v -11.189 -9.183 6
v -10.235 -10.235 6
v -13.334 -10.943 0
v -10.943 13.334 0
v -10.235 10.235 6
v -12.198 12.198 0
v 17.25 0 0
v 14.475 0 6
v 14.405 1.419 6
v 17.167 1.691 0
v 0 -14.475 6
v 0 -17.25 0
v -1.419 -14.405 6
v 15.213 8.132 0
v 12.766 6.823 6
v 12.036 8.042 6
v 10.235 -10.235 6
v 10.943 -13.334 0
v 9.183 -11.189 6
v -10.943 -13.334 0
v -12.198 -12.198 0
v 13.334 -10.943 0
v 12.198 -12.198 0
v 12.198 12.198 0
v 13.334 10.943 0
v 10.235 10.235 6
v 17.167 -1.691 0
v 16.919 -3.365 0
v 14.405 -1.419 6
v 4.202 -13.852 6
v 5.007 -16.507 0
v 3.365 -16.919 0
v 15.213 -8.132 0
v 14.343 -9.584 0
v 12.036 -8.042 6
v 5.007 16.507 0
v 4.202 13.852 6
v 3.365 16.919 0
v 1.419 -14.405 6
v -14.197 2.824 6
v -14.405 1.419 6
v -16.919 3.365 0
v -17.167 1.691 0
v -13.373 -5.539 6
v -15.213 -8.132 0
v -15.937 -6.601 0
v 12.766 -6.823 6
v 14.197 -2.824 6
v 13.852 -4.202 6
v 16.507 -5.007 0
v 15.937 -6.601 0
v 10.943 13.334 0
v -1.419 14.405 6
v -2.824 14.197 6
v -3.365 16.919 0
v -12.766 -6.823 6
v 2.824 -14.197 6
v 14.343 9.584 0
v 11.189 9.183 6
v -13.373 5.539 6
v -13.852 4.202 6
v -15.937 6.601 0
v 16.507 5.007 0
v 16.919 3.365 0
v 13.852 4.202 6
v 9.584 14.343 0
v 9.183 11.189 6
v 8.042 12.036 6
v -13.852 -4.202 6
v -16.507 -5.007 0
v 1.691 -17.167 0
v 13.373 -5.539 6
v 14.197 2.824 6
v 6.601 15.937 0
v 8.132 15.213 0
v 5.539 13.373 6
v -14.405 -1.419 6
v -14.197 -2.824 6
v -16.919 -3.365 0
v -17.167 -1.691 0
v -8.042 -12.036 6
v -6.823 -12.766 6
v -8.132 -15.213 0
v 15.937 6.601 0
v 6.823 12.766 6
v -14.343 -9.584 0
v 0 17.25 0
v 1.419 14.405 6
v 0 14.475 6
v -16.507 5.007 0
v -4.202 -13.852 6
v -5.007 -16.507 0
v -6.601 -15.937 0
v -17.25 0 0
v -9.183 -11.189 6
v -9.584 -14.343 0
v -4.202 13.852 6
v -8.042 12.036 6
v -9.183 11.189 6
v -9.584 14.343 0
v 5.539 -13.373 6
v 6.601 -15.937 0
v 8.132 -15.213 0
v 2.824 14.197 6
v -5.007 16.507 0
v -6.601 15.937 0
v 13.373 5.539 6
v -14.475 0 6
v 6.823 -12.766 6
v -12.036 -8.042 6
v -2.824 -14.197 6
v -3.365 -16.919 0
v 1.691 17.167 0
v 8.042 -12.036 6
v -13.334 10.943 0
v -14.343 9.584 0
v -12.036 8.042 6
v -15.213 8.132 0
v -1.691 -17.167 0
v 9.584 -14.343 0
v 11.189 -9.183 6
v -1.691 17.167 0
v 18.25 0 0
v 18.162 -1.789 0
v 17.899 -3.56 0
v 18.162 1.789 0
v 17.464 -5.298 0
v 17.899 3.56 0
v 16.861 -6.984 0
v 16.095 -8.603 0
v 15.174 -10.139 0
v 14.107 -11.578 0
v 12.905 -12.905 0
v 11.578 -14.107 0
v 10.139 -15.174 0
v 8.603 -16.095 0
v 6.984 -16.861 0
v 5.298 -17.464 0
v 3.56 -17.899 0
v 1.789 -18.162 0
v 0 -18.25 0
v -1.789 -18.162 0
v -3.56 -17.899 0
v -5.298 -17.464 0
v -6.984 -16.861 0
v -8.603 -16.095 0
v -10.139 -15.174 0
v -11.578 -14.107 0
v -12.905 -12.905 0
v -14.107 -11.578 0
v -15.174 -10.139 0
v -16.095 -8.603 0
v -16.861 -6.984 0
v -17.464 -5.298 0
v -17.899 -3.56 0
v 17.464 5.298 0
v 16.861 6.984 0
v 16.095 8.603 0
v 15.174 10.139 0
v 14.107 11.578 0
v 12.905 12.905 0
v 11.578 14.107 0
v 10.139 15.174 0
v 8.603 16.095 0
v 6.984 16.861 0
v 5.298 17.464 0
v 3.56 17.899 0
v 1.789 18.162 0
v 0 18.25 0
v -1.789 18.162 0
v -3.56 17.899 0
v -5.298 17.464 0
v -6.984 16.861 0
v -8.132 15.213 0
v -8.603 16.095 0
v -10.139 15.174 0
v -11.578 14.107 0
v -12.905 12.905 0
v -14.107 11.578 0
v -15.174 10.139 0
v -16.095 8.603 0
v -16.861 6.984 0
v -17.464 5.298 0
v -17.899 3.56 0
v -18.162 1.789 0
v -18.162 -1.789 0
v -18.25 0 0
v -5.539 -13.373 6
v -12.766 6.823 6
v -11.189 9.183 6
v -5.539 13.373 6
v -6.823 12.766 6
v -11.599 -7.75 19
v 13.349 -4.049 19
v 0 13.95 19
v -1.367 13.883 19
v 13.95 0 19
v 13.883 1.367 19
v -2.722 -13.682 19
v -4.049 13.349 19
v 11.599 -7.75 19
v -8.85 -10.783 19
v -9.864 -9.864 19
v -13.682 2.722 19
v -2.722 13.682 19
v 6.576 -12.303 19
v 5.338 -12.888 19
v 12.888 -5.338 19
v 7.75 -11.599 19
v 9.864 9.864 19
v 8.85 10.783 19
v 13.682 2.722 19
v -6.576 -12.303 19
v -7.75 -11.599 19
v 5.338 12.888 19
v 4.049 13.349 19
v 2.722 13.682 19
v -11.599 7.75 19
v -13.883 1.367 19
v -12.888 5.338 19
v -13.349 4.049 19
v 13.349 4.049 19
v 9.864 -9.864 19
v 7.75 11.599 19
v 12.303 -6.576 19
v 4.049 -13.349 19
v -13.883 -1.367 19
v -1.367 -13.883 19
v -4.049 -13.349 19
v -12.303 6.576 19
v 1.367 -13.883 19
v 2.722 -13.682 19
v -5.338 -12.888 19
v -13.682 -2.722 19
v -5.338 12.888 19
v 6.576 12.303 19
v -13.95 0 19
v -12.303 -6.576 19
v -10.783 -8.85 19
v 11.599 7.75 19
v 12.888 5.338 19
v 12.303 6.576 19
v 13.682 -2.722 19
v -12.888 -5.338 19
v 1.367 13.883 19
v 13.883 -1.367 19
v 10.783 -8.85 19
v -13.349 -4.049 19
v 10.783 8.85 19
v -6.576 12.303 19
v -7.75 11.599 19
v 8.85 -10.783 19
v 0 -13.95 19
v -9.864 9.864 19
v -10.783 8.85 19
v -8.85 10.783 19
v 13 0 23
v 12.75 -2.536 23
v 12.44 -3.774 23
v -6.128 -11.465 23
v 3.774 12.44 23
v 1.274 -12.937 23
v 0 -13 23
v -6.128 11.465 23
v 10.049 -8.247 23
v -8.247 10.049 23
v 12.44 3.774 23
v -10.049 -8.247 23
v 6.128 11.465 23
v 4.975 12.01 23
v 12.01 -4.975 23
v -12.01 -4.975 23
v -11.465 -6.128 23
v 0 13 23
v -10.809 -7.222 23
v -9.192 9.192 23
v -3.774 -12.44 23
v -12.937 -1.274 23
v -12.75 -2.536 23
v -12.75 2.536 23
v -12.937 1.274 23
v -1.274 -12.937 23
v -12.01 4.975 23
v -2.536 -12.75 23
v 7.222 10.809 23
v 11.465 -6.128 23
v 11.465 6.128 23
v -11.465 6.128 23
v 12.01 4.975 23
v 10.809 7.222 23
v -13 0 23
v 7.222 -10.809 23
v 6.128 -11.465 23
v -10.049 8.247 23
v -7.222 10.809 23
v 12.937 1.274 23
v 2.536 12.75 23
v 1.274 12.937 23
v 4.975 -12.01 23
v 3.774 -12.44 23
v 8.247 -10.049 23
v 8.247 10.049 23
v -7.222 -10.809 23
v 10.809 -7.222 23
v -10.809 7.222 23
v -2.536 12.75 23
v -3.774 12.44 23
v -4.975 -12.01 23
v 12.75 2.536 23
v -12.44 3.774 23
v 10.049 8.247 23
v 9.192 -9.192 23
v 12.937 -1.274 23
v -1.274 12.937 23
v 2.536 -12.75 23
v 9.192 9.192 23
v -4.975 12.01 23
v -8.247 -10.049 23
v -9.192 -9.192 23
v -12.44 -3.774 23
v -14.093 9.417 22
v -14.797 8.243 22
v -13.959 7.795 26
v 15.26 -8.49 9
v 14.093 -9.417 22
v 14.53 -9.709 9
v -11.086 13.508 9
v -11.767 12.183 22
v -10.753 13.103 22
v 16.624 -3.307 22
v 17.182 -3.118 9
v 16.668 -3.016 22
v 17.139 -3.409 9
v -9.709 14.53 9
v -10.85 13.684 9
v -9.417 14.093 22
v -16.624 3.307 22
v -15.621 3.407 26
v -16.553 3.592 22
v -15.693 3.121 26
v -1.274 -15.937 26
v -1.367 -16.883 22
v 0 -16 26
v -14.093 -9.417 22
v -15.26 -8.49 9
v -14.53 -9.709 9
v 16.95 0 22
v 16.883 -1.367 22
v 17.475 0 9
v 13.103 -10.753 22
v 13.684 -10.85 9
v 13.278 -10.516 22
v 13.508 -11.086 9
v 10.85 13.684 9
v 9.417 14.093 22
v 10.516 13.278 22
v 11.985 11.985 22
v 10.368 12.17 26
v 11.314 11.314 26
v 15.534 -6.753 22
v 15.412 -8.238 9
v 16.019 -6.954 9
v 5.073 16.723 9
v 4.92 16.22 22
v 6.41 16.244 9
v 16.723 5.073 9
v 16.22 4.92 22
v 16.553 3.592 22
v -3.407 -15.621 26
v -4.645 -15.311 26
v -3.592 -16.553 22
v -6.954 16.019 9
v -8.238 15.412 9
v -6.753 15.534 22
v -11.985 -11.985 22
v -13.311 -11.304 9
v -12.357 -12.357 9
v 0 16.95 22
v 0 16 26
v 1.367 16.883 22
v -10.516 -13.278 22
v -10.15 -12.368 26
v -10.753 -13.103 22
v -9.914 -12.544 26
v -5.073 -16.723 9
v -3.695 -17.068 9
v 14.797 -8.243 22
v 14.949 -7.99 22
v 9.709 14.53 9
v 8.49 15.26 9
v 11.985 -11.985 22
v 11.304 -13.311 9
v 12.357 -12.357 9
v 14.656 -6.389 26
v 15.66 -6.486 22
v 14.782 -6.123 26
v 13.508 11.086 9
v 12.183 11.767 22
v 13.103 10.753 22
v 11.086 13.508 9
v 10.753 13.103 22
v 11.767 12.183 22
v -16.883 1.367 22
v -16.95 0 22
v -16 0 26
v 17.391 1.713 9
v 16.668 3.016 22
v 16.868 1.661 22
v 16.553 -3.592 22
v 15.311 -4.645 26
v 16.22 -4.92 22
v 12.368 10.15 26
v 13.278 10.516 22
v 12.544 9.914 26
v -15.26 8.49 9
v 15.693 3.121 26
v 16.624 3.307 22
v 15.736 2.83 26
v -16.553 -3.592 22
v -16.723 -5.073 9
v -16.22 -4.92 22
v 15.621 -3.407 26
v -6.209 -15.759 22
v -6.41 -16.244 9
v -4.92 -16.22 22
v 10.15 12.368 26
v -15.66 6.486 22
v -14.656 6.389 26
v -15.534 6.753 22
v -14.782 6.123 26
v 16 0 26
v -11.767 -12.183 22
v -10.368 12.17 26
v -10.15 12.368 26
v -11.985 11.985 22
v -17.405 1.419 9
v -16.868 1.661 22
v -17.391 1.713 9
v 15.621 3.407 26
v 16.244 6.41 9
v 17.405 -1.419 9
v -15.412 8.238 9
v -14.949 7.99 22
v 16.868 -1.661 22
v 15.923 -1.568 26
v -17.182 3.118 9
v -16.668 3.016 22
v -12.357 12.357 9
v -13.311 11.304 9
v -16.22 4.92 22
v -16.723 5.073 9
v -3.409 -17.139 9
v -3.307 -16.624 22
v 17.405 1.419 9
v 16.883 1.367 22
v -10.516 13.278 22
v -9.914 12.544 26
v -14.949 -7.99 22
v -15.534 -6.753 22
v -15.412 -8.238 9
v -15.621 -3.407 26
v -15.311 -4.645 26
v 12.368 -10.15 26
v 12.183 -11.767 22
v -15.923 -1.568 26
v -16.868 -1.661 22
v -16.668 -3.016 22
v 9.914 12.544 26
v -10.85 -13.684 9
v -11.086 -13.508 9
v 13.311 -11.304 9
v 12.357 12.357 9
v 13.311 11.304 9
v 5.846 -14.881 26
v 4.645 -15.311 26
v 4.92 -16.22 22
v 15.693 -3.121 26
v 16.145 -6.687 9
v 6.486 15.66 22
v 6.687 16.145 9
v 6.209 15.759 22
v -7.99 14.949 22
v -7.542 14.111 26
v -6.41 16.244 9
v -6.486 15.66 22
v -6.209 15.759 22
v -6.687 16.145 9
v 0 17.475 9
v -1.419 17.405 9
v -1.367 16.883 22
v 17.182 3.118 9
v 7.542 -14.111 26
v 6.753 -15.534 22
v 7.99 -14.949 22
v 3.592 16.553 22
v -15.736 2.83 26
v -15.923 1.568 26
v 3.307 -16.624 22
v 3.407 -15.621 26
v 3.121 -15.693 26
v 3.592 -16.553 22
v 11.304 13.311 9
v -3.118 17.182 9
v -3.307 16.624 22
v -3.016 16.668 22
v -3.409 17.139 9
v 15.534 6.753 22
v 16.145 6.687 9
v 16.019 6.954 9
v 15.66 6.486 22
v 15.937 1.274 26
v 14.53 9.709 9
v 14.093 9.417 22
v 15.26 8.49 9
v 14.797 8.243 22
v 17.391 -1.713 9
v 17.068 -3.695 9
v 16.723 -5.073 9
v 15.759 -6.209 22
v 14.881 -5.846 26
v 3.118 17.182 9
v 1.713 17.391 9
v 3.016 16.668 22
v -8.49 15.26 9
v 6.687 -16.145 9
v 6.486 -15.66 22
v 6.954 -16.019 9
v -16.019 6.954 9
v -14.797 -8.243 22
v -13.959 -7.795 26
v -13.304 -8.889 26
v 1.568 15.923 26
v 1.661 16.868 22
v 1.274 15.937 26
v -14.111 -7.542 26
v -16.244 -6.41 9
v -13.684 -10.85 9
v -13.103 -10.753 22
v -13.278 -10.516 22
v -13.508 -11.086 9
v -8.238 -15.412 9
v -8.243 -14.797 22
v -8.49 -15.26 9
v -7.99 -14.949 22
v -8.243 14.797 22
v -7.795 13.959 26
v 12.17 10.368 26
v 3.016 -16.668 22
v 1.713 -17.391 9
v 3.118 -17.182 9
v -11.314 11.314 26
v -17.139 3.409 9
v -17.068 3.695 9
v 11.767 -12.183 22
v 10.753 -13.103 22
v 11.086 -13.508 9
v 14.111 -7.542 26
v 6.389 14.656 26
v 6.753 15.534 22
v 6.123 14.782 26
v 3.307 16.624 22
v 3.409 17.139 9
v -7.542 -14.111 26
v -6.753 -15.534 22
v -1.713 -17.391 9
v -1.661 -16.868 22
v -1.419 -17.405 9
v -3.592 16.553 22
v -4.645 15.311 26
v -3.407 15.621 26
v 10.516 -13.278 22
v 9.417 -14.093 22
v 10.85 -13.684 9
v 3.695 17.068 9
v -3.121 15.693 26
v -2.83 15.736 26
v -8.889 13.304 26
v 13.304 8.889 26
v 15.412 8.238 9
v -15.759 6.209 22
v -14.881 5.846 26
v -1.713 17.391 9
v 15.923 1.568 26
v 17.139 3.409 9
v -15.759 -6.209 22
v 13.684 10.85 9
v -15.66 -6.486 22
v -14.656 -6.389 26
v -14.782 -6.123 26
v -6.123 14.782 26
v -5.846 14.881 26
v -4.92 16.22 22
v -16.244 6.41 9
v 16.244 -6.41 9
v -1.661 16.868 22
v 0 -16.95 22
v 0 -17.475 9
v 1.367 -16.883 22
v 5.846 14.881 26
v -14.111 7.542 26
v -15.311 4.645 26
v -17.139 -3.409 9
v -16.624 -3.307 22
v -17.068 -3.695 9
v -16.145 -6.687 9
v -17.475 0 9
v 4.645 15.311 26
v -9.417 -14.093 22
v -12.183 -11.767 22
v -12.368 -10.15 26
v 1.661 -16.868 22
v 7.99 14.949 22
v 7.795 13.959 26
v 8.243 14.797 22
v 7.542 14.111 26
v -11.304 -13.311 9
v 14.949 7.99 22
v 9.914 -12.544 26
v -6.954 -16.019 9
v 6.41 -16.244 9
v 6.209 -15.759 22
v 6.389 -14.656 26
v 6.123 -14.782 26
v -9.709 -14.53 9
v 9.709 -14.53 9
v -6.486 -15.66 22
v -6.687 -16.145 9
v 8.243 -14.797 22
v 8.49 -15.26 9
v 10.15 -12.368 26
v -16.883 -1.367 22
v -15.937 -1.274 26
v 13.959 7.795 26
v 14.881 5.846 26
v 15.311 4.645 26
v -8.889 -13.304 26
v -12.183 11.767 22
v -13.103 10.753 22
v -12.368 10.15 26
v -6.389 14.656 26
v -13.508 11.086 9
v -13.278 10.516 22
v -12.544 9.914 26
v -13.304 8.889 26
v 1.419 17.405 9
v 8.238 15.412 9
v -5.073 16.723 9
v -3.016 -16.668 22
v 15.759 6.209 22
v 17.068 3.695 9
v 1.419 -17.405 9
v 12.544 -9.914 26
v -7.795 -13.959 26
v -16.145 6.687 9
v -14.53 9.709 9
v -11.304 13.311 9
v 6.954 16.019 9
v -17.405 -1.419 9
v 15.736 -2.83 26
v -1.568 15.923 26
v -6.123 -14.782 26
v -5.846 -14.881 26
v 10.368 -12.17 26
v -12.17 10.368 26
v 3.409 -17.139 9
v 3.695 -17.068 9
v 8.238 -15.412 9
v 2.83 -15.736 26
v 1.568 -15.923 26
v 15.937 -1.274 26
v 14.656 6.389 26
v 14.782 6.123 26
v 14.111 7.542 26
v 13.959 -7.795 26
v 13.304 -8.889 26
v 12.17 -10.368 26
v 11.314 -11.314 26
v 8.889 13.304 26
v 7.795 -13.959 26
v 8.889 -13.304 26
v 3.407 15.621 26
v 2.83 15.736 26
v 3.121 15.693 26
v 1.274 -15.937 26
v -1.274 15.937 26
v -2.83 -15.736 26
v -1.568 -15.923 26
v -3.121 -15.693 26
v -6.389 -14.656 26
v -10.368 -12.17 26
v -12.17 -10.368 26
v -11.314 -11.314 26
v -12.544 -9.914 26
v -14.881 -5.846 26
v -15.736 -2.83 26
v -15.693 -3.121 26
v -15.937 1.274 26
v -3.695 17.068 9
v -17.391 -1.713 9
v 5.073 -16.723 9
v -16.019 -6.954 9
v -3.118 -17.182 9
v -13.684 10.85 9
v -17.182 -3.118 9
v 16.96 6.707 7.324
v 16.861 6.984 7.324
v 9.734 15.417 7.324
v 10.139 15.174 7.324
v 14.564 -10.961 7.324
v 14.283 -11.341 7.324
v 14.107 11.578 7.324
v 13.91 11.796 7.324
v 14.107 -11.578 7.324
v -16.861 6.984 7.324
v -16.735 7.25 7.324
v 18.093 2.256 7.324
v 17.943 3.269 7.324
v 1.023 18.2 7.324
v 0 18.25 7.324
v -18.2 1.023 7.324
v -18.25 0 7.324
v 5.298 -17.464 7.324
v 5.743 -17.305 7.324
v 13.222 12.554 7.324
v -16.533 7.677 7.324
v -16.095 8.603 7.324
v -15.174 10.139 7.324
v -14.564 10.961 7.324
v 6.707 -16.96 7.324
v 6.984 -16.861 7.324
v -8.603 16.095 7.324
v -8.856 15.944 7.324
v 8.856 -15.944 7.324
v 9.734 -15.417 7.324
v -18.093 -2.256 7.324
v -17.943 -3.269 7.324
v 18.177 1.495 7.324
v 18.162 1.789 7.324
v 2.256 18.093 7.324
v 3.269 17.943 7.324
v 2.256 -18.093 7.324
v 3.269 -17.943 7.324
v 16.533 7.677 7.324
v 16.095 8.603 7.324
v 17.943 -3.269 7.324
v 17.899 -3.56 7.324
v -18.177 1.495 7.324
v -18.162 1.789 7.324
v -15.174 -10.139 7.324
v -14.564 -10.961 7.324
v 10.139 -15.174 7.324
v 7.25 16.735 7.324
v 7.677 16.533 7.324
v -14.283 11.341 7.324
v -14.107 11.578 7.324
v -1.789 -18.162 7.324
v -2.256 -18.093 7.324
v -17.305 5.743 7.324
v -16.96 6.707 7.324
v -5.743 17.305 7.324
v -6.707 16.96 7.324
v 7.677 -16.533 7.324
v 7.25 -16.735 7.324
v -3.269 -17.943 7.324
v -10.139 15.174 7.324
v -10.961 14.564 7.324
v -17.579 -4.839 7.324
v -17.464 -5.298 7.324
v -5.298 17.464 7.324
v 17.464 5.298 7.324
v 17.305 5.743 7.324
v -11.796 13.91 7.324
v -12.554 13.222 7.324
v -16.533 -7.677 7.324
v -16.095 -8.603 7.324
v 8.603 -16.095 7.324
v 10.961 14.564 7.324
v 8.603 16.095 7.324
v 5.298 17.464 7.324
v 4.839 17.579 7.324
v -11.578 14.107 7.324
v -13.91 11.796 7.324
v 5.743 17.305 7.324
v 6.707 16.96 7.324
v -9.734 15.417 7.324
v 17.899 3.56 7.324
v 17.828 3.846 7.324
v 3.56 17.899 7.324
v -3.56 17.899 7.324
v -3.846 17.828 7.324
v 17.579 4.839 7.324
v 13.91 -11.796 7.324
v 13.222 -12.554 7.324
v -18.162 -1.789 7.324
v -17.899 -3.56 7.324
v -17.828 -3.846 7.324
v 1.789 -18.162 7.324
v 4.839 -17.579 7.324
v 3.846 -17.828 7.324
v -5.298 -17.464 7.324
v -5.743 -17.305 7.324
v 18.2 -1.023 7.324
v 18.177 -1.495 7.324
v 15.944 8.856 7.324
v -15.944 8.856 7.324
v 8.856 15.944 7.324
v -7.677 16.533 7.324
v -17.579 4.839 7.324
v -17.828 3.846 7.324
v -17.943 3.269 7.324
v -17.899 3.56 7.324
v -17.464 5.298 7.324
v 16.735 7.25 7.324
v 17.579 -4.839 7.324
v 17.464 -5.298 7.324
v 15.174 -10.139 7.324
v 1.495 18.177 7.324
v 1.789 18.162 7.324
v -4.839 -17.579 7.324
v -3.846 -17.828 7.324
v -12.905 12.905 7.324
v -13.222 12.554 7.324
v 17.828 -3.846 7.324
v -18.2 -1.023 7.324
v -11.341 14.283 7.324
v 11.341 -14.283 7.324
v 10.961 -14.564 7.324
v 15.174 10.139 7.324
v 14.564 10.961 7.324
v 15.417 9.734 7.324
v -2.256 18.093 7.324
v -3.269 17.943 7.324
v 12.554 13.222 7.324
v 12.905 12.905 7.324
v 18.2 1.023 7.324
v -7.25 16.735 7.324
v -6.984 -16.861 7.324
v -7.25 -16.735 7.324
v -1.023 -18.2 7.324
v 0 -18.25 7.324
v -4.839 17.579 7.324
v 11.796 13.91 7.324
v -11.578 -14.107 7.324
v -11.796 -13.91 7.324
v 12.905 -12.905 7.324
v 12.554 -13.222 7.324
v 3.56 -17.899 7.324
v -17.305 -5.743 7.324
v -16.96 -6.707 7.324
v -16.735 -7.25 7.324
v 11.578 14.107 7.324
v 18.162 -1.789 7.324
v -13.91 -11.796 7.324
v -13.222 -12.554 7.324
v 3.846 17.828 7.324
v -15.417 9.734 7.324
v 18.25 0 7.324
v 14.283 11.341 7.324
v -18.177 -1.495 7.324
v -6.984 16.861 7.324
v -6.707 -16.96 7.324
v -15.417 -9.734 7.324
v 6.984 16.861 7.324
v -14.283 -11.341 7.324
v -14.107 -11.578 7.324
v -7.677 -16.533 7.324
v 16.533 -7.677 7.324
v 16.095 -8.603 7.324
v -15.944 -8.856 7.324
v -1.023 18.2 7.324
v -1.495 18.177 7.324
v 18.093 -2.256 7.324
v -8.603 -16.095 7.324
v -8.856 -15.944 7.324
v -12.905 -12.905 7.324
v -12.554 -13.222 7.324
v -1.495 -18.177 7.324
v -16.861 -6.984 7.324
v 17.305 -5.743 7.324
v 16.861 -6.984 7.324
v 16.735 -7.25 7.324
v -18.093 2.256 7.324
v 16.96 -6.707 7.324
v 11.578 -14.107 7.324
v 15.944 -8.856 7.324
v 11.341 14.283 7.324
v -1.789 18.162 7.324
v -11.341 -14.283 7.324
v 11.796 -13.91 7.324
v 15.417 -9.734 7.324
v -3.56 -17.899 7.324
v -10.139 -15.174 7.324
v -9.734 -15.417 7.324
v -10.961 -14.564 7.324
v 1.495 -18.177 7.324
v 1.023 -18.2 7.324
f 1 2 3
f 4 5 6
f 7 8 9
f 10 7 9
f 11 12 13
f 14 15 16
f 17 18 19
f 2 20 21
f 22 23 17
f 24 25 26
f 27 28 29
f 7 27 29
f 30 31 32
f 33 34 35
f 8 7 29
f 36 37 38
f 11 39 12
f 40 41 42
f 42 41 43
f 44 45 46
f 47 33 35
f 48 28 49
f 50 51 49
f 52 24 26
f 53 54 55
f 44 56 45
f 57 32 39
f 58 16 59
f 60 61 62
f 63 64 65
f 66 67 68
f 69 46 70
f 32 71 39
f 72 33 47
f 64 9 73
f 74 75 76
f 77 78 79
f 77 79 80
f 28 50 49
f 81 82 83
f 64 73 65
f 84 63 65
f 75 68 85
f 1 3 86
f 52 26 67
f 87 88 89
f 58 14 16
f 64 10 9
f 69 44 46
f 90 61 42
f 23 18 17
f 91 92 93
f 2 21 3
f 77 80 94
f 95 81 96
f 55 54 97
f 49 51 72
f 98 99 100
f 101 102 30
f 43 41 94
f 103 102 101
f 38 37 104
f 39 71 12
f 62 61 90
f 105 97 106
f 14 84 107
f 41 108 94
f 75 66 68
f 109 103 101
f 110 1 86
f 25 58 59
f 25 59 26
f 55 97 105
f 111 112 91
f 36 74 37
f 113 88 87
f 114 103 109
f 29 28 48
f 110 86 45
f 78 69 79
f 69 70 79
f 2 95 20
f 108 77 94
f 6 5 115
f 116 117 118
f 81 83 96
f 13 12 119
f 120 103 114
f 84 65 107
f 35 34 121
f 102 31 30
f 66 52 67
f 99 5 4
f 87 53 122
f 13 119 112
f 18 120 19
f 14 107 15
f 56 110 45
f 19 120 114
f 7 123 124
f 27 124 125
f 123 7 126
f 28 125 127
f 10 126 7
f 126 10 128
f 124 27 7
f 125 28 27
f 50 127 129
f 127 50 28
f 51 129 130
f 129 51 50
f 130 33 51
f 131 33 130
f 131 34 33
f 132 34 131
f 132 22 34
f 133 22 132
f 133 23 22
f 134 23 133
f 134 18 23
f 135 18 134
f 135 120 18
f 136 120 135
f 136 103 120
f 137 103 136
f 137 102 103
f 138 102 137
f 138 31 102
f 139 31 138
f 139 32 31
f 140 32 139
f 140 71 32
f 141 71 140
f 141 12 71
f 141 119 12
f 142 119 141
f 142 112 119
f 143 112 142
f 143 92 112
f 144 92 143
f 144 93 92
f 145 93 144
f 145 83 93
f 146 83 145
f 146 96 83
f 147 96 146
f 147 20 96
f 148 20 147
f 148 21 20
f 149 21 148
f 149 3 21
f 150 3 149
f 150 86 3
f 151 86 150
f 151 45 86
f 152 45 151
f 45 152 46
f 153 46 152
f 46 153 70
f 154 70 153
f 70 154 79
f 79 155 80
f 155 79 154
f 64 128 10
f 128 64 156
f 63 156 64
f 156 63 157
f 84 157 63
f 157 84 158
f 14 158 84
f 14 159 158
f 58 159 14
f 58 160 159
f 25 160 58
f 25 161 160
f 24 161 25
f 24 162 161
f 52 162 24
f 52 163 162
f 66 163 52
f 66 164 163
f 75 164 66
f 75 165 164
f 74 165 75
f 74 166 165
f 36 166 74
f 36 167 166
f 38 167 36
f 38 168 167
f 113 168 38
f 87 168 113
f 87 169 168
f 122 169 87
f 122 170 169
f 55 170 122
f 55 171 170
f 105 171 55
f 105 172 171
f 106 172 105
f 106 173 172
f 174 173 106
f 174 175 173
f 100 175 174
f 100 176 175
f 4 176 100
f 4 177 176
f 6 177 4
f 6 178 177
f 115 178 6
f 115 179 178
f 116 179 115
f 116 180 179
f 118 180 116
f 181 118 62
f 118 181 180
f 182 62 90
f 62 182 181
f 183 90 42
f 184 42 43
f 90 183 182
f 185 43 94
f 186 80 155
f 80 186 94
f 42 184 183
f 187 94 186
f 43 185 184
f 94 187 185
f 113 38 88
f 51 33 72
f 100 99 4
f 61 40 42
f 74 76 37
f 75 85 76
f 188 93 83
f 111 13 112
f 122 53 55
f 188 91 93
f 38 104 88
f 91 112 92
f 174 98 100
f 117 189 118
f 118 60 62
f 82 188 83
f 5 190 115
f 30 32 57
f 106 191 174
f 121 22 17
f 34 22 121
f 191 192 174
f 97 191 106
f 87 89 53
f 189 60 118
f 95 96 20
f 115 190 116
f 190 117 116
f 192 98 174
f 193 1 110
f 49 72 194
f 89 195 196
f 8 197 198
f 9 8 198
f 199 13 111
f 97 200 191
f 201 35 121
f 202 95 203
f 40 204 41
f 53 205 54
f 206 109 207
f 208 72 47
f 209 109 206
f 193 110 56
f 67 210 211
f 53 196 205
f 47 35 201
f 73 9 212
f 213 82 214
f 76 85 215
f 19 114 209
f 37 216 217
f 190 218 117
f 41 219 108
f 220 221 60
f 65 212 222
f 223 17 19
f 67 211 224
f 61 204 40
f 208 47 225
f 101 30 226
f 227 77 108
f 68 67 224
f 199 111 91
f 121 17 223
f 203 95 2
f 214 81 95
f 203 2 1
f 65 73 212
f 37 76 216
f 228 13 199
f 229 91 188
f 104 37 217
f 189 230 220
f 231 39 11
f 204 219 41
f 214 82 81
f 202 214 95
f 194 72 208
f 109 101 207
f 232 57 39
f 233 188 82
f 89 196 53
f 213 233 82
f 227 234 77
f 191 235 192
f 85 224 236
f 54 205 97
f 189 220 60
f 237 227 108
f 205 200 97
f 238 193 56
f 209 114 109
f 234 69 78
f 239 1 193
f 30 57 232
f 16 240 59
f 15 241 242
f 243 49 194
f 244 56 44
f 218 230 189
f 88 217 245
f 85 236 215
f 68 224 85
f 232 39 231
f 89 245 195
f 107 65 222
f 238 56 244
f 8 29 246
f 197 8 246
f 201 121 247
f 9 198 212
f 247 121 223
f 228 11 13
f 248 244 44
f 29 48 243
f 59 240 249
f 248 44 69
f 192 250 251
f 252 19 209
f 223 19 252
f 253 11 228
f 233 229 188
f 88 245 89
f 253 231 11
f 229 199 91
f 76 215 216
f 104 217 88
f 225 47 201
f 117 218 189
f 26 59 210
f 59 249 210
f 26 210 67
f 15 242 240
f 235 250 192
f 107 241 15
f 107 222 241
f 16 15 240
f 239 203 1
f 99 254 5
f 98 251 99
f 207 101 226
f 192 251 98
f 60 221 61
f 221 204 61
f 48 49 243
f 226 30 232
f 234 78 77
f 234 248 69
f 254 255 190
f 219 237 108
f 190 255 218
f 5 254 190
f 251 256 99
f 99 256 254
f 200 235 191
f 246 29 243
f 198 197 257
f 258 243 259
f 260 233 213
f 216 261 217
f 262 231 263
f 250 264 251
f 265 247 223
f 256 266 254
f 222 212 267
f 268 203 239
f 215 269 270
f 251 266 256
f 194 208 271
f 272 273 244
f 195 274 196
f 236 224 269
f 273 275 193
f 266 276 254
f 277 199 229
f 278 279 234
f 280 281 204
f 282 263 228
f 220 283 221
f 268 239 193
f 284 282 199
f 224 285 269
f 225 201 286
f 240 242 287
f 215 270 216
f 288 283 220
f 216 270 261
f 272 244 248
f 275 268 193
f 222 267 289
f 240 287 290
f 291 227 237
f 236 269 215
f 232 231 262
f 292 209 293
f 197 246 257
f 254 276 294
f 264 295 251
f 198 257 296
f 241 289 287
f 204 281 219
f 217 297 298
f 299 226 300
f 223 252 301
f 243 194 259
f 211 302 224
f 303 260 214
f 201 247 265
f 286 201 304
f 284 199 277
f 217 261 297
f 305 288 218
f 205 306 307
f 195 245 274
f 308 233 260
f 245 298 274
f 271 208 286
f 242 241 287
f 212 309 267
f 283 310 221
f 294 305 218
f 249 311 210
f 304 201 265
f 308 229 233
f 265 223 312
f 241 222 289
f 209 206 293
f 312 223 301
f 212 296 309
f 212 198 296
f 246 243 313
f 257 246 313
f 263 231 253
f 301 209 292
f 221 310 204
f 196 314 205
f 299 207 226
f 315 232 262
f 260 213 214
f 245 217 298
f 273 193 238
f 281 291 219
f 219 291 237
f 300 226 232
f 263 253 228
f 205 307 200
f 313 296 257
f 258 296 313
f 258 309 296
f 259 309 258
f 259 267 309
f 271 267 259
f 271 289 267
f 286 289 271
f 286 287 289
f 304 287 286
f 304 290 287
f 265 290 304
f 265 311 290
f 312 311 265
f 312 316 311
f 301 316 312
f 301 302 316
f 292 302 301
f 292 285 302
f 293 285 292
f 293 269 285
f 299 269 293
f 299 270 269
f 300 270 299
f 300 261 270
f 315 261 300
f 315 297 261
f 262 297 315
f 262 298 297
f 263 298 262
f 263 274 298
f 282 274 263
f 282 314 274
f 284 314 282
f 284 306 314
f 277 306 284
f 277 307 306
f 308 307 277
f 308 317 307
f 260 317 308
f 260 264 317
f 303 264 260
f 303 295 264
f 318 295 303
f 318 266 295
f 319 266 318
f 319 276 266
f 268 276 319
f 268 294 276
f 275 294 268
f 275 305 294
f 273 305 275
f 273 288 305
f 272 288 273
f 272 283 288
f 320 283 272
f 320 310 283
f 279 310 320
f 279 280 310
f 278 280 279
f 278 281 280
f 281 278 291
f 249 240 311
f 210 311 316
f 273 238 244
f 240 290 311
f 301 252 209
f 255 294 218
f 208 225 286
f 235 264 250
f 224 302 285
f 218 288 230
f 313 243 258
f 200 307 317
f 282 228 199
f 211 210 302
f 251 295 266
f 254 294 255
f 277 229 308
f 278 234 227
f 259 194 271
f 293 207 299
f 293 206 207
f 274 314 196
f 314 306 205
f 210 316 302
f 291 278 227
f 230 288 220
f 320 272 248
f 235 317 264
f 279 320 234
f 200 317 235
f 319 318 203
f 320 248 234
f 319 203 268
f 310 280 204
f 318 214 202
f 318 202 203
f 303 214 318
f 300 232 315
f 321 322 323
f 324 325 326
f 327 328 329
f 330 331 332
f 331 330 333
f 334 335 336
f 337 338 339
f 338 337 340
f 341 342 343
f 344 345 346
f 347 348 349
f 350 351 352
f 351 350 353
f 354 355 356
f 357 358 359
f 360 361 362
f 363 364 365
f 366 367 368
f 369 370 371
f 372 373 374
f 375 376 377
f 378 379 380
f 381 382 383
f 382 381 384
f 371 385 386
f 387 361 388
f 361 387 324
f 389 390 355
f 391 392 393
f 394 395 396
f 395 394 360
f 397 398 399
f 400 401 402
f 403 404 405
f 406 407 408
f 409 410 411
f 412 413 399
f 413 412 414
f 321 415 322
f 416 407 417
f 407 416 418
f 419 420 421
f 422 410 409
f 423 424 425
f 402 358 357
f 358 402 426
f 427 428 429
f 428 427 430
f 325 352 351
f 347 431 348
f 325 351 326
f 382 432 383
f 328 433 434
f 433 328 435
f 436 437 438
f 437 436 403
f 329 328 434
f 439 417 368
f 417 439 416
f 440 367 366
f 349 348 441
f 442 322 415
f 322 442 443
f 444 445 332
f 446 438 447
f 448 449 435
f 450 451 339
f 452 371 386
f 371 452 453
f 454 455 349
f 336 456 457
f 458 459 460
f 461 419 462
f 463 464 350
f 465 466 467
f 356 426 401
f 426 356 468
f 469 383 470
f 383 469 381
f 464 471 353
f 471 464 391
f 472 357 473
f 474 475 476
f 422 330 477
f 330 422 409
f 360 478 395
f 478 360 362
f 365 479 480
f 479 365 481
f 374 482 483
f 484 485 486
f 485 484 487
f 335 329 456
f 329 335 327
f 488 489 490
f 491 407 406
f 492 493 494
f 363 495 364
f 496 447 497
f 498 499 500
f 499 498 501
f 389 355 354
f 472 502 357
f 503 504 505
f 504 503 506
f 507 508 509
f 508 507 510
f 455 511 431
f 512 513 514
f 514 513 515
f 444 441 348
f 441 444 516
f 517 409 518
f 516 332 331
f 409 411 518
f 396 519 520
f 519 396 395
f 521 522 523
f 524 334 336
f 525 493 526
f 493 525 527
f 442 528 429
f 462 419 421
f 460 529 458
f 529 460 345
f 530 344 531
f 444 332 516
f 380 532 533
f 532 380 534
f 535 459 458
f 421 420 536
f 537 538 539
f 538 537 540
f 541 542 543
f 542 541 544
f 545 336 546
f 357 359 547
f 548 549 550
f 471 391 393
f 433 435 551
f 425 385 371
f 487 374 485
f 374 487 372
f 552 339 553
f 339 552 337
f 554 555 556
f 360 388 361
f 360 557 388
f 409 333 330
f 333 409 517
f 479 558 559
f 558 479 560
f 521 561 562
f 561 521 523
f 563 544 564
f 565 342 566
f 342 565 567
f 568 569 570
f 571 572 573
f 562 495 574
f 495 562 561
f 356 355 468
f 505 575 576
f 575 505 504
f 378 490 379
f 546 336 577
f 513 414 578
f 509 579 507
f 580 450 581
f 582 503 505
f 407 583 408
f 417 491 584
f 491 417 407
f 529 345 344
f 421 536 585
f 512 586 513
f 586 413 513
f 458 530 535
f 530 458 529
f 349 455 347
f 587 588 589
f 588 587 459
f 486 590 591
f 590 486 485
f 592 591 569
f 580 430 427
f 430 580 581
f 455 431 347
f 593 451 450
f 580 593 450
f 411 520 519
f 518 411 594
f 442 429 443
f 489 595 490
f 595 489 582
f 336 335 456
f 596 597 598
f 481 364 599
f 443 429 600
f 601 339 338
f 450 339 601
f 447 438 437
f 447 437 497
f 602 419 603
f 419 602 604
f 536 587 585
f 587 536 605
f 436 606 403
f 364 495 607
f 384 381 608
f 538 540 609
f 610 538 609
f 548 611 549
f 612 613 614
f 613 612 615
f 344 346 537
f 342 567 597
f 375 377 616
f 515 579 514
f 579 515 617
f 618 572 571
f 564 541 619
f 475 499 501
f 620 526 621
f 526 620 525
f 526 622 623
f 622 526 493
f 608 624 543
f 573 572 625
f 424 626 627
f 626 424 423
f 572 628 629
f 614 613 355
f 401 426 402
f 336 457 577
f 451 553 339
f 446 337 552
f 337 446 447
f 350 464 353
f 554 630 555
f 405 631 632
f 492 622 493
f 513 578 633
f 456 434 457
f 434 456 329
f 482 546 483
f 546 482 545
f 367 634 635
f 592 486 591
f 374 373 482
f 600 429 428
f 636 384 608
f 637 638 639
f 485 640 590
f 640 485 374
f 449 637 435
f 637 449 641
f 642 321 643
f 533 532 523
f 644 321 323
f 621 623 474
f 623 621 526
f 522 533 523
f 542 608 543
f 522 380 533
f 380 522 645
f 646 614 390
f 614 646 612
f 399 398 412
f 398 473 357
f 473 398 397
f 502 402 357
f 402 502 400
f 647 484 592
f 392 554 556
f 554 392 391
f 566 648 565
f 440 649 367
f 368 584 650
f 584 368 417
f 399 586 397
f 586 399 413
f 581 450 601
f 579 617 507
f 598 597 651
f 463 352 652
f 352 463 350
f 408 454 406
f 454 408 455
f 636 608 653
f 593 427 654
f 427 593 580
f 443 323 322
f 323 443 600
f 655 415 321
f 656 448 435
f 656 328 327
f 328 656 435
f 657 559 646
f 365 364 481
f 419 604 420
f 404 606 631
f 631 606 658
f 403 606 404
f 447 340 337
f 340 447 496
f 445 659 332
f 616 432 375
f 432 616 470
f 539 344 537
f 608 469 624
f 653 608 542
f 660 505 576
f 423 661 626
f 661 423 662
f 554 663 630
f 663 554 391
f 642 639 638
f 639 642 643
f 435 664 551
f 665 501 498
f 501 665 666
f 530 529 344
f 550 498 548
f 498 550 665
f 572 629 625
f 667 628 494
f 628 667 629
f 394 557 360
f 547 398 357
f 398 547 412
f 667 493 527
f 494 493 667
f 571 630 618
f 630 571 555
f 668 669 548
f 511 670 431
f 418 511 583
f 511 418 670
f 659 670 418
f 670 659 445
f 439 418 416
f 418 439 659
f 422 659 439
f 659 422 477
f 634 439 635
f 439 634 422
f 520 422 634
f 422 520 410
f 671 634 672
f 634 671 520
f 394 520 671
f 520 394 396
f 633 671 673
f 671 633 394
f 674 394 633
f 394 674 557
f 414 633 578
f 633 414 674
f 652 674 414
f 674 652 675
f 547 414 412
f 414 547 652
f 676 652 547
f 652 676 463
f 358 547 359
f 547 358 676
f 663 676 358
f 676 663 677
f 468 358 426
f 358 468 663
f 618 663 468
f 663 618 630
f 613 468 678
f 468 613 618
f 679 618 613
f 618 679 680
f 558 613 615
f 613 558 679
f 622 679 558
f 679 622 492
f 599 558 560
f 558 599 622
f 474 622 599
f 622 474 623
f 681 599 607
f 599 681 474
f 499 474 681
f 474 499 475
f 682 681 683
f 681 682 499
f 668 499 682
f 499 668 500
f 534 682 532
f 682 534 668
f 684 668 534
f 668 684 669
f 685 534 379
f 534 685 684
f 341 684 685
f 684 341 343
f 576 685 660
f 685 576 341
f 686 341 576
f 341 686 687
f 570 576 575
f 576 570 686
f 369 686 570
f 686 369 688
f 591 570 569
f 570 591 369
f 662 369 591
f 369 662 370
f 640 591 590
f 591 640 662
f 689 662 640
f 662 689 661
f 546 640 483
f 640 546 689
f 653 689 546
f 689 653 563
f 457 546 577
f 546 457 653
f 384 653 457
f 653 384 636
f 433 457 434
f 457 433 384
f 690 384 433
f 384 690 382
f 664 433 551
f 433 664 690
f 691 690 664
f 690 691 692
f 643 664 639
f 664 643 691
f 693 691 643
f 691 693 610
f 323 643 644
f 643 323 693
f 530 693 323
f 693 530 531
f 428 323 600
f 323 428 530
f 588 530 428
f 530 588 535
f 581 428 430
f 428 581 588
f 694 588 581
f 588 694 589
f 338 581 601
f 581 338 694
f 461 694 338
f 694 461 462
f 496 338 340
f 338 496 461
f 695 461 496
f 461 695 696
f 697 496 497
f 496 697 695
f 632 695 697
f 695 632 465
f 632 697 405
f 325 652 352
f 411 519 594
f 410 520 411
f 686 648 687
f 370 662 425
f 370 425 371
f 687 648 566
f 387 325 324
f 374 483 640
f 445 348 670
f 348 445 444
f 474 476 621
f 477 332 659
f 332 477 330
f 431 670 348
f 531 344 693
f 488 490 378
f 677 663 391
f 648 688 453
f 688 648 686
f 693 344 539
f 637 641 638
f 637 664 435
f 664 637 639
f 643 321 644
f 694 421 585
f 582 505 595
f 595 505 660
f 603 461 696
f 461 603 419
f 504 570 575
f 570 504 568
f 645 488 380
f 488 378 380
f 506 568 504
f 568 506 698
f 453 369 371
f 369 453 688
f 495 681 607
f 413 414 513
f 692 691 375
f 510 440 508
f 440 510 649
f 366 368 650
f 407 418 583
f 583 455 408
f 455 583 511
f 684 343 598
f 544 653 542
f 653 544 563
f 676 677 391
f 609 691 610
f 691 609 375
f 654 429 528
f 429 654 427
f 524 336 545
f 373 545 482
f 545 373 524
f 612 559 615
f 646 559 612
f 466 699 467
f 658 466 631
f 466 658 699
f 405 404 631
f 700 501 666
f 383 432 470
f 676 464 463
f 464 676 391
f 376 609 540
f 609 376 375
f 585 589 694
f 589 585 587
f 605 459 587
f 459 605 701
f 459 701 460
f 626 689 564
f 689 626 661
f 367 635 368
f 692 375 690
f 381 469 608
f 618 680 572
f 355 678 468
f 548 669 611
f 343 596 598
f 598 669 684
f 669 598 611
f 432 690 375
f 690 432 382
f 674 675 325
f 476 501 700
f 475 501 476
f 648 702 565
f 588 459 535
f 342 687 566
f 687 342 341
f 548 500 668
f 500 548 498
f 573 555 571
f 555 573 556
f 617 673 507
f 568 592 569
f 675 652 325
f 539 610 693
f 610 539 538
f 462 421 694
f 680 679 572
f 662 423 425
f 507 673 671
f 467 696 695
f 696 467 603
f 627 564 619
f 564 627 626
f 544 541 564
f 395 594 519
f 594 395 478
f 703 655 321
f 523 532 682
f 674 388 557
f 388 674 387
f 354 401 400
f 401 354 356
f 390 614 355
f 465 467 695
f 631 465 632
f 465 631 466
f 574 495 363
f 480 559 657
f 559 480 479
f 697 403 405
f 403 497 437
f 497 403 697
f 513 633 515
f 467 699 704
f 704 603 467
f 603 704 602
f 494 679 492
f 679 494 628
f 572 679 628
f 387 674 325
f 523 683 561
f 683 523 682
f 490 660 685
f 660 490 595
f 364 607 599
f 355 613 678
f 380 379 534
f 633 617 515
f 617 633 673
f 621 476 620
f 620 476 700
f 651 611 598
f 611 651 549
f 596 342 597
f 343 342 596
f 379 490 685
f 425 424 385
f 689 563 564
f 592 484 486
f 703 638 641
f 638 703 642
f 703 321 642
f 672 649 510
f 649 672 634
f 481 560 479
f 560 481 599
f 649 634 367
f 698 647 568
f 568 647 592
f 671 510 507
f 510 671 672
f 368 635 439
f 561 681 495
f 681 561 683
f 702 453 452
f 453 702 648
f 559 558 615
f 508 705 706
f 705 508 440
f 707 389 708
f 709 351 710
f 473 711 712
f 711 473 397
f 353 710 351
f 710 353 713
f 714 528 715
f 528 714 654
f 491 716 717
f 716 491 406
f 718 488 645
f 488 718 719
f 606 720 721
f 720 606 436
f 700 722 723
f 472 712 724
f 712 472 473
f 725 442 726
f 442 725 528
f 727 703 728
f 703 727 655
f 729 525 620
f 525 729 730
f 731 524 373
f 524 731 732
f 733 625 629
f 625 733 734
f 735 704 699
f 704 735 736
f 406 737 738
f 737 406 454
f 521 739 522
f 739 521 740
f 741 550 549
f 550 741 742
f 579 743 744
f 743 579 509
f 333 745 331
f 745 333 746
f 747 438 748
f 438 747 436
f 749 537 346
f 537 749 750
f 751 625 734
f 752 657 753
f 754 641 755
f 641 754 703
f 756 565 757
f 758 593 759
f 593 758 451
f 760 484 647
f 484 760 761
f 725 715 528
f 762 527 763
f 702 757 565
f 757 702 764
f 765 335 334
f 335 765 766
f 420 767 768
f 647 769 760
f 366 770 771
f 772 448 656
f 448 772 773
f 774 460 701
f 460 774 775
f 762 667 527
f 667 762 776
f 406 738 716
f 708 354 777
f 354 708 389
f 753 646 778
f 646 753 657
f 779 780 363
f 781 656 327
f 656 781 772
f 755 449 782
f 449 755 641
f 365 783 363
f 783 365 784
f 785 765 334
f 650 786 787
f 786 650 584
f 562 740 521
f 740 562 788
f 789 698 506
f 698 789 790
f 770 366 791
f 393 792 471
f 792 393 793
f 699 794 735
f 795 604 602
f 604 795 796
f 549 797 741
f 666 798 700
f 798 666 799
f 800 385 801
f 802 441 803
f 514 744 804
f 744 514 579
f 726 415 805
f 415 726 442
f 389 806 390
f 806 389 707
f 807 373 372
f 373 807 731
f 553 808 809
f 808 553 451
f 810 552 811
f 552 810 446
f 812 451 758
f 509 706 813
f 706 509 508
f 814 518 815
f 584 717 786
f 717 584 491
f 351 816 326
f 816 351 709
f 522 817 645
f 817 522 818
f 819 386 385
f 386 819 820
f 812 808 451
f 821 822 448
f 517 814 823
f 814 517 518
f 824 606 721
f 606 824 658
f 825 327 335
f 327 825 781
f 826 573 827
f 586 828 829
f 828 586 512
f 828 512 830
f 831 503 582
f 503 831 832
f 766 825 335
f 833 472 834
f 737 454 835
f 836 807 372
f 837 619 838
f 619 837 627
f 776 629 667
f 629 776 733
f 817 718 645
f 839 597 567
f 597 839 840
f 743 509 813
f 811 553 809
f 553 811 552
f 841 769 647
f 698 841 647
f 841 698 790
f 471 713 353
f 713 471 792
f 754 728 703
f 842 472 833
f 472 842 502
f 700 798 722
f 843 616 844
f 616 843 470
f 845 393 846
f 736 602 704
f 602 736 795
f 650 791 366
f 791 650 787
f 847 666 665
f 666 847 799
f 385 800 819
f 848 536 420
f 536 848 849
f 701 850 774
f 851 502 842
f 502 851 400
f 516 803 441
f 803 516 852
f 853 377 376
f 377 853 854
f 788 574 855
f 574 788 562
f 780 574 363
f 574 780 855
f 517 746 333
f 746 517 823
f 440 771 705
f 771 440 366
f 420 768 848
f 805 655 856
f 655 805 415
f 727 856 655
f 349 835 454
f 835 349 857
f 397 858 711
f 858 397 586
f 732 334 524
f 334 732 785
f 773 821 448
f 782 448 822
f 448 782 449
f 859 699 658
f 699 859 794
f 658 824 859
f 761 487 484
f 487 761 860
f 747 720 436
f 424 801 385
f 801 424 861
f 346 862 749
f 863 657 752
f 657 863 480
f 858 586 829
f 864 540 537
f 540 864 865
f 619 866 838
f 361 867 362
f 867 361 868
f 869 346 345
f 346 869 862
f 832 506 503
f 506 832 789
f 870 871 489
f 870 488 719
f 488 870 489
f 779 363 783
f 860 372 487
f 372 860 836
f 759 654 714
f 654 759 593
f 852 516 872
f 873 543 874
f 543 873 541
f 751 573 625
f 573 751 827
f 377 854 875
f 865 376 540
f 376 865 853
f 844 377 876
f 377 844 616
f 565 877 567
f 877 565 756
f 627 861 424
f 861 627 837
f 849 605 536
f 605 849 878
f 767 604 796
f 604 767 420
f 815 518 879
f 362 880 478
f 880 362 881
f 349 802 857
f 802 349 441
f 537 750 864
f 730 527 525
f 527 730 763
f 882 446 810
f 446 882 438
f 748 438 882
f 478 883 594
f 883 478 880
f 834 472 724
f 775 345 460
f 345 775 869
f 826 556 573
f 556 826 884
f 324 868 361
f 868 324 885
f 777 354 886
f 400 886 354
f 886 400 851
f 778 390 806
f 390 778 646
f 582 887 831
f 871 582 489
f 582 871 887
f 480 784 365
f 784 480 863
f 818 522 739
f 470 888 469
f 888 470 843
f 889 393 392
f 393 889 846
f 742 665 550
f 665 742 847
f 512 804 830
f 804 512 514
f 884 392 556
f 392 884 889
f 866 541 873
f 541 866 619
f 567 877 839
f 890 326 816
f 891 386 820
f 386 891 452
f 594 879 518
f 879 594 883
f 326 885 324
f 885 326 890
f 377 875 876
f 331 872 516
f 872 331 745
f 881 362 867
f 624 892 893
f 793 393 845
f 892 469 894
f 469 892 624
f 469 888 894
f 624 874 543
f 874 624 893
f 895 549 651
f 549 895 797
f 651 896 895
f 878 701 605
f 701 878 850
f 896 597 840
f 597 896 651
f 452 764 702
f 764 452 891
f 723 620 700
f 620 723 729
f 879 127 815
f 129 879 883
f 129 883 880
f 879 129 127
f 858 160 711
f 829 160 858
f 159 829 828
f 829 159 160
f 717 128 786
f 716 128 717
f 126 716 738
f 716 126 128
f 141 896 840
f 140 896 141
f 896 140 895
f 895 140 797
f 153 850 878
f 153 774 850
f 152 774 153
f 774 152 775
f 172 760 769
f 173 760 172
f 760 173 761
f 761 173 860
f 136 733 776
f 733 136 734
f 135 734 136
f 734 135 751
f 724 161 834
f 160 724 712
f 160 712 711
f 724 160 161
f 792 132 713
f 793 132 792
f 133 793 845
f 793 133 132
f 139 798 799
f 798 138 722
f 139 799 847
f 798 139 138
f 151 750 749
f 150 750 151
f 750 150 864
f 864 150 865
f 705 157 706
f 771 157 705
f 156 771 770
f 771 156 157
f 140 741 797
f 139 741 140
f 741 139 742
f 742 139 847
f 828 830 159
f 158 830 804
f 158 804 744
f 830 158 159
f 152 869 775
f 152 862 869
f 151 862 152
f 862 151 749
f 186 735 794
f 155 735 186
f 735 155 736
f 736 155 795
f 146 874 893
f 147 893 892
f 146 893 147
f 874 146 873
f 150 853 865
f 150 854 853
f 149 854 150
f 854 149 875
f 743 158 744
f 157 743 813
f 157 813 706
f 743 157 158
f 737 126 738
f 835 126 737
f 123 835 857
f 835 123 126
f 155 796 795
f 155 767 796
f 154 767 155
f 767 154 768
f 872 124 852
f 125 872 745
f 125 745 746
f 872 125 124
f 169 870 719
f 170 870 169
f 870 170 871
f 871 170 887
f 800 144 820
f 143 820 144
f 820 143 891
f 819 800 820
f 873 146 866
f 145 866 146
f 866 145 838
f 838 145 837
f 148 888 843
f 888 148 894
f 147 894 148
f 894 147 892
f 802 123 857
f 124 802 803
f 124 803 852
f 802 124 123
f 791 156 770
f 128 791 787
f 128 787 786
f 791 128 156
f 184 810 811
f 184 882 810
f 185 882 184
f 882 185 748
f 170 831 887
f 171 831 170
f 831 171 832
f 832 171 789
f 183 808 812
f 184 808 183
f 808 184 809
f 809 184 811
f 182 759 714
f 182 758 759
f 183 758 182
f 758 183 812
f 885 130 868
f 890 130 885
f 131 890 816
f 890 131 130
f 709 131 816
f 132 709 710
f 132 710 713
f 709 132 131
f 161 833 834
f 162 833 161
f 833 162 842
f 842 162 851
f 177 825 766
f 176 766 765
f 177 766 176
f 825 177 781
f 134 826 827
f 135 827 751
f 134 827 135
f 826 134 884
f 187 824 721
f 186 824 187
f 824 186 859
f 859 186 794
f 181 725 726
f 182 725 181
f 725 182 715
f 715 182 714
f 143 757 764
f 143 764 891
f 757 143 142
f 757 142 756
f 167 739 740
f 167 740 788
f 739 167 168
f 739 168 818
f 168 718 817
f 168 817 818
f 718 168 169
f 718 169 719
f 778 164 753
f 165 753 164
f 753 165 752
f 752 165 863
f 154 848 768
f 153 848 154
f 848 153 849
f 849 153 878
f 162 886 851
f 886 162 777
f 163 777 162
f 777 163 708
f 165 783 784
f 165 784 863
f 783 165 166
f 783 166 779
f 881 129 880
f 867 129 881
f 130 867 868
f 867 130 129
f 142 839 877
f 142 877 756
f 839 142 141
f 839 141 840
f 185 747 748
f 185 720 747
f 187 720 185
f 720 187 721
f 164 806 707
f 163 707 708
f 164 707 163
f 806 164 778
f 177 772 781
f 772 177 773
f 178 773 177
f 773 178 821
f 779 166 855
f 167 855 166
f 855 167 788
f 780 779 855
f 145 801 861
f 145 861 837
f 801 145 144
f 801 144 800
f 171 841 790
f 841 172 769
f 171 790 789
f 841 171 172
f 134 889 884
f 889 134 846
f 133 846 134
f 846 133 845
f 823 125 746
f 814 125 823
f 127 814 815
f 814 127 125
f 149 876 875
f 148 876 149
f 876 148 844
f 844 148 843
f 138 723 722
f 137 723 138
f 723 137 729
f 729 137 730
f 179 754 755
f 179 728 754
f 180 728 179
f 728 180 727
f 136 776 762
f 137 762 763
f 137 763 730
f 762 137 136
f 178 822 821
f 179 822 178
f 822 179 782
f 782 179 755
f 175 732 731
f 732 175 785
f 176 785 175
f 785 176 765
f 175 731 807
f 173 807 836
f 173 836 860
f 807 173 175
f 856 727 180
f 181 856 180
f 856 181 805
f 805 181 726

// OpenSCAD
// Dashcam Lense Cap
$fn = 64;

lense_upper_d = 26.8-0.8;
tip_h = 4;
primary_taper_d = 28.7-0.8;
taper_h = 13;
bottom_taper_d = 29.75-0.8;
cap_thick = 3;
base_h = 6;
base_d = 34.5;

module spherinder(r, h) {
    union() {
        cylinder(r=r, h=h/2);
        scale([1,1,h/r/2])
        sphere(r=r);
    }
}
//spherinder(3,10);

module lense() {
    cylinder(d1=base_d, d2=bottom_taper_d, h=base_h);
    translate([0,0,base_h])
    cylinder(d1=bottom_taper_d, d2=primary_taper_d, h=taper_h);
    translate([0,0,base_h+taper_h])
    cylinder(d2=lense_upper_d, d1=primary_taper_d, h=tip_h);
}

module lenseCap() {
    difference() {
        minkowski() {
            lense();
            cylinder(r=cap_thick, h=cap_thick);
        }
        lense();
        translate([0,0,-50])
        cube(100, center=true);
    }
}
intersection() {
    lenseCap();
    cylinder(d=base_d+2, h=100);
}
